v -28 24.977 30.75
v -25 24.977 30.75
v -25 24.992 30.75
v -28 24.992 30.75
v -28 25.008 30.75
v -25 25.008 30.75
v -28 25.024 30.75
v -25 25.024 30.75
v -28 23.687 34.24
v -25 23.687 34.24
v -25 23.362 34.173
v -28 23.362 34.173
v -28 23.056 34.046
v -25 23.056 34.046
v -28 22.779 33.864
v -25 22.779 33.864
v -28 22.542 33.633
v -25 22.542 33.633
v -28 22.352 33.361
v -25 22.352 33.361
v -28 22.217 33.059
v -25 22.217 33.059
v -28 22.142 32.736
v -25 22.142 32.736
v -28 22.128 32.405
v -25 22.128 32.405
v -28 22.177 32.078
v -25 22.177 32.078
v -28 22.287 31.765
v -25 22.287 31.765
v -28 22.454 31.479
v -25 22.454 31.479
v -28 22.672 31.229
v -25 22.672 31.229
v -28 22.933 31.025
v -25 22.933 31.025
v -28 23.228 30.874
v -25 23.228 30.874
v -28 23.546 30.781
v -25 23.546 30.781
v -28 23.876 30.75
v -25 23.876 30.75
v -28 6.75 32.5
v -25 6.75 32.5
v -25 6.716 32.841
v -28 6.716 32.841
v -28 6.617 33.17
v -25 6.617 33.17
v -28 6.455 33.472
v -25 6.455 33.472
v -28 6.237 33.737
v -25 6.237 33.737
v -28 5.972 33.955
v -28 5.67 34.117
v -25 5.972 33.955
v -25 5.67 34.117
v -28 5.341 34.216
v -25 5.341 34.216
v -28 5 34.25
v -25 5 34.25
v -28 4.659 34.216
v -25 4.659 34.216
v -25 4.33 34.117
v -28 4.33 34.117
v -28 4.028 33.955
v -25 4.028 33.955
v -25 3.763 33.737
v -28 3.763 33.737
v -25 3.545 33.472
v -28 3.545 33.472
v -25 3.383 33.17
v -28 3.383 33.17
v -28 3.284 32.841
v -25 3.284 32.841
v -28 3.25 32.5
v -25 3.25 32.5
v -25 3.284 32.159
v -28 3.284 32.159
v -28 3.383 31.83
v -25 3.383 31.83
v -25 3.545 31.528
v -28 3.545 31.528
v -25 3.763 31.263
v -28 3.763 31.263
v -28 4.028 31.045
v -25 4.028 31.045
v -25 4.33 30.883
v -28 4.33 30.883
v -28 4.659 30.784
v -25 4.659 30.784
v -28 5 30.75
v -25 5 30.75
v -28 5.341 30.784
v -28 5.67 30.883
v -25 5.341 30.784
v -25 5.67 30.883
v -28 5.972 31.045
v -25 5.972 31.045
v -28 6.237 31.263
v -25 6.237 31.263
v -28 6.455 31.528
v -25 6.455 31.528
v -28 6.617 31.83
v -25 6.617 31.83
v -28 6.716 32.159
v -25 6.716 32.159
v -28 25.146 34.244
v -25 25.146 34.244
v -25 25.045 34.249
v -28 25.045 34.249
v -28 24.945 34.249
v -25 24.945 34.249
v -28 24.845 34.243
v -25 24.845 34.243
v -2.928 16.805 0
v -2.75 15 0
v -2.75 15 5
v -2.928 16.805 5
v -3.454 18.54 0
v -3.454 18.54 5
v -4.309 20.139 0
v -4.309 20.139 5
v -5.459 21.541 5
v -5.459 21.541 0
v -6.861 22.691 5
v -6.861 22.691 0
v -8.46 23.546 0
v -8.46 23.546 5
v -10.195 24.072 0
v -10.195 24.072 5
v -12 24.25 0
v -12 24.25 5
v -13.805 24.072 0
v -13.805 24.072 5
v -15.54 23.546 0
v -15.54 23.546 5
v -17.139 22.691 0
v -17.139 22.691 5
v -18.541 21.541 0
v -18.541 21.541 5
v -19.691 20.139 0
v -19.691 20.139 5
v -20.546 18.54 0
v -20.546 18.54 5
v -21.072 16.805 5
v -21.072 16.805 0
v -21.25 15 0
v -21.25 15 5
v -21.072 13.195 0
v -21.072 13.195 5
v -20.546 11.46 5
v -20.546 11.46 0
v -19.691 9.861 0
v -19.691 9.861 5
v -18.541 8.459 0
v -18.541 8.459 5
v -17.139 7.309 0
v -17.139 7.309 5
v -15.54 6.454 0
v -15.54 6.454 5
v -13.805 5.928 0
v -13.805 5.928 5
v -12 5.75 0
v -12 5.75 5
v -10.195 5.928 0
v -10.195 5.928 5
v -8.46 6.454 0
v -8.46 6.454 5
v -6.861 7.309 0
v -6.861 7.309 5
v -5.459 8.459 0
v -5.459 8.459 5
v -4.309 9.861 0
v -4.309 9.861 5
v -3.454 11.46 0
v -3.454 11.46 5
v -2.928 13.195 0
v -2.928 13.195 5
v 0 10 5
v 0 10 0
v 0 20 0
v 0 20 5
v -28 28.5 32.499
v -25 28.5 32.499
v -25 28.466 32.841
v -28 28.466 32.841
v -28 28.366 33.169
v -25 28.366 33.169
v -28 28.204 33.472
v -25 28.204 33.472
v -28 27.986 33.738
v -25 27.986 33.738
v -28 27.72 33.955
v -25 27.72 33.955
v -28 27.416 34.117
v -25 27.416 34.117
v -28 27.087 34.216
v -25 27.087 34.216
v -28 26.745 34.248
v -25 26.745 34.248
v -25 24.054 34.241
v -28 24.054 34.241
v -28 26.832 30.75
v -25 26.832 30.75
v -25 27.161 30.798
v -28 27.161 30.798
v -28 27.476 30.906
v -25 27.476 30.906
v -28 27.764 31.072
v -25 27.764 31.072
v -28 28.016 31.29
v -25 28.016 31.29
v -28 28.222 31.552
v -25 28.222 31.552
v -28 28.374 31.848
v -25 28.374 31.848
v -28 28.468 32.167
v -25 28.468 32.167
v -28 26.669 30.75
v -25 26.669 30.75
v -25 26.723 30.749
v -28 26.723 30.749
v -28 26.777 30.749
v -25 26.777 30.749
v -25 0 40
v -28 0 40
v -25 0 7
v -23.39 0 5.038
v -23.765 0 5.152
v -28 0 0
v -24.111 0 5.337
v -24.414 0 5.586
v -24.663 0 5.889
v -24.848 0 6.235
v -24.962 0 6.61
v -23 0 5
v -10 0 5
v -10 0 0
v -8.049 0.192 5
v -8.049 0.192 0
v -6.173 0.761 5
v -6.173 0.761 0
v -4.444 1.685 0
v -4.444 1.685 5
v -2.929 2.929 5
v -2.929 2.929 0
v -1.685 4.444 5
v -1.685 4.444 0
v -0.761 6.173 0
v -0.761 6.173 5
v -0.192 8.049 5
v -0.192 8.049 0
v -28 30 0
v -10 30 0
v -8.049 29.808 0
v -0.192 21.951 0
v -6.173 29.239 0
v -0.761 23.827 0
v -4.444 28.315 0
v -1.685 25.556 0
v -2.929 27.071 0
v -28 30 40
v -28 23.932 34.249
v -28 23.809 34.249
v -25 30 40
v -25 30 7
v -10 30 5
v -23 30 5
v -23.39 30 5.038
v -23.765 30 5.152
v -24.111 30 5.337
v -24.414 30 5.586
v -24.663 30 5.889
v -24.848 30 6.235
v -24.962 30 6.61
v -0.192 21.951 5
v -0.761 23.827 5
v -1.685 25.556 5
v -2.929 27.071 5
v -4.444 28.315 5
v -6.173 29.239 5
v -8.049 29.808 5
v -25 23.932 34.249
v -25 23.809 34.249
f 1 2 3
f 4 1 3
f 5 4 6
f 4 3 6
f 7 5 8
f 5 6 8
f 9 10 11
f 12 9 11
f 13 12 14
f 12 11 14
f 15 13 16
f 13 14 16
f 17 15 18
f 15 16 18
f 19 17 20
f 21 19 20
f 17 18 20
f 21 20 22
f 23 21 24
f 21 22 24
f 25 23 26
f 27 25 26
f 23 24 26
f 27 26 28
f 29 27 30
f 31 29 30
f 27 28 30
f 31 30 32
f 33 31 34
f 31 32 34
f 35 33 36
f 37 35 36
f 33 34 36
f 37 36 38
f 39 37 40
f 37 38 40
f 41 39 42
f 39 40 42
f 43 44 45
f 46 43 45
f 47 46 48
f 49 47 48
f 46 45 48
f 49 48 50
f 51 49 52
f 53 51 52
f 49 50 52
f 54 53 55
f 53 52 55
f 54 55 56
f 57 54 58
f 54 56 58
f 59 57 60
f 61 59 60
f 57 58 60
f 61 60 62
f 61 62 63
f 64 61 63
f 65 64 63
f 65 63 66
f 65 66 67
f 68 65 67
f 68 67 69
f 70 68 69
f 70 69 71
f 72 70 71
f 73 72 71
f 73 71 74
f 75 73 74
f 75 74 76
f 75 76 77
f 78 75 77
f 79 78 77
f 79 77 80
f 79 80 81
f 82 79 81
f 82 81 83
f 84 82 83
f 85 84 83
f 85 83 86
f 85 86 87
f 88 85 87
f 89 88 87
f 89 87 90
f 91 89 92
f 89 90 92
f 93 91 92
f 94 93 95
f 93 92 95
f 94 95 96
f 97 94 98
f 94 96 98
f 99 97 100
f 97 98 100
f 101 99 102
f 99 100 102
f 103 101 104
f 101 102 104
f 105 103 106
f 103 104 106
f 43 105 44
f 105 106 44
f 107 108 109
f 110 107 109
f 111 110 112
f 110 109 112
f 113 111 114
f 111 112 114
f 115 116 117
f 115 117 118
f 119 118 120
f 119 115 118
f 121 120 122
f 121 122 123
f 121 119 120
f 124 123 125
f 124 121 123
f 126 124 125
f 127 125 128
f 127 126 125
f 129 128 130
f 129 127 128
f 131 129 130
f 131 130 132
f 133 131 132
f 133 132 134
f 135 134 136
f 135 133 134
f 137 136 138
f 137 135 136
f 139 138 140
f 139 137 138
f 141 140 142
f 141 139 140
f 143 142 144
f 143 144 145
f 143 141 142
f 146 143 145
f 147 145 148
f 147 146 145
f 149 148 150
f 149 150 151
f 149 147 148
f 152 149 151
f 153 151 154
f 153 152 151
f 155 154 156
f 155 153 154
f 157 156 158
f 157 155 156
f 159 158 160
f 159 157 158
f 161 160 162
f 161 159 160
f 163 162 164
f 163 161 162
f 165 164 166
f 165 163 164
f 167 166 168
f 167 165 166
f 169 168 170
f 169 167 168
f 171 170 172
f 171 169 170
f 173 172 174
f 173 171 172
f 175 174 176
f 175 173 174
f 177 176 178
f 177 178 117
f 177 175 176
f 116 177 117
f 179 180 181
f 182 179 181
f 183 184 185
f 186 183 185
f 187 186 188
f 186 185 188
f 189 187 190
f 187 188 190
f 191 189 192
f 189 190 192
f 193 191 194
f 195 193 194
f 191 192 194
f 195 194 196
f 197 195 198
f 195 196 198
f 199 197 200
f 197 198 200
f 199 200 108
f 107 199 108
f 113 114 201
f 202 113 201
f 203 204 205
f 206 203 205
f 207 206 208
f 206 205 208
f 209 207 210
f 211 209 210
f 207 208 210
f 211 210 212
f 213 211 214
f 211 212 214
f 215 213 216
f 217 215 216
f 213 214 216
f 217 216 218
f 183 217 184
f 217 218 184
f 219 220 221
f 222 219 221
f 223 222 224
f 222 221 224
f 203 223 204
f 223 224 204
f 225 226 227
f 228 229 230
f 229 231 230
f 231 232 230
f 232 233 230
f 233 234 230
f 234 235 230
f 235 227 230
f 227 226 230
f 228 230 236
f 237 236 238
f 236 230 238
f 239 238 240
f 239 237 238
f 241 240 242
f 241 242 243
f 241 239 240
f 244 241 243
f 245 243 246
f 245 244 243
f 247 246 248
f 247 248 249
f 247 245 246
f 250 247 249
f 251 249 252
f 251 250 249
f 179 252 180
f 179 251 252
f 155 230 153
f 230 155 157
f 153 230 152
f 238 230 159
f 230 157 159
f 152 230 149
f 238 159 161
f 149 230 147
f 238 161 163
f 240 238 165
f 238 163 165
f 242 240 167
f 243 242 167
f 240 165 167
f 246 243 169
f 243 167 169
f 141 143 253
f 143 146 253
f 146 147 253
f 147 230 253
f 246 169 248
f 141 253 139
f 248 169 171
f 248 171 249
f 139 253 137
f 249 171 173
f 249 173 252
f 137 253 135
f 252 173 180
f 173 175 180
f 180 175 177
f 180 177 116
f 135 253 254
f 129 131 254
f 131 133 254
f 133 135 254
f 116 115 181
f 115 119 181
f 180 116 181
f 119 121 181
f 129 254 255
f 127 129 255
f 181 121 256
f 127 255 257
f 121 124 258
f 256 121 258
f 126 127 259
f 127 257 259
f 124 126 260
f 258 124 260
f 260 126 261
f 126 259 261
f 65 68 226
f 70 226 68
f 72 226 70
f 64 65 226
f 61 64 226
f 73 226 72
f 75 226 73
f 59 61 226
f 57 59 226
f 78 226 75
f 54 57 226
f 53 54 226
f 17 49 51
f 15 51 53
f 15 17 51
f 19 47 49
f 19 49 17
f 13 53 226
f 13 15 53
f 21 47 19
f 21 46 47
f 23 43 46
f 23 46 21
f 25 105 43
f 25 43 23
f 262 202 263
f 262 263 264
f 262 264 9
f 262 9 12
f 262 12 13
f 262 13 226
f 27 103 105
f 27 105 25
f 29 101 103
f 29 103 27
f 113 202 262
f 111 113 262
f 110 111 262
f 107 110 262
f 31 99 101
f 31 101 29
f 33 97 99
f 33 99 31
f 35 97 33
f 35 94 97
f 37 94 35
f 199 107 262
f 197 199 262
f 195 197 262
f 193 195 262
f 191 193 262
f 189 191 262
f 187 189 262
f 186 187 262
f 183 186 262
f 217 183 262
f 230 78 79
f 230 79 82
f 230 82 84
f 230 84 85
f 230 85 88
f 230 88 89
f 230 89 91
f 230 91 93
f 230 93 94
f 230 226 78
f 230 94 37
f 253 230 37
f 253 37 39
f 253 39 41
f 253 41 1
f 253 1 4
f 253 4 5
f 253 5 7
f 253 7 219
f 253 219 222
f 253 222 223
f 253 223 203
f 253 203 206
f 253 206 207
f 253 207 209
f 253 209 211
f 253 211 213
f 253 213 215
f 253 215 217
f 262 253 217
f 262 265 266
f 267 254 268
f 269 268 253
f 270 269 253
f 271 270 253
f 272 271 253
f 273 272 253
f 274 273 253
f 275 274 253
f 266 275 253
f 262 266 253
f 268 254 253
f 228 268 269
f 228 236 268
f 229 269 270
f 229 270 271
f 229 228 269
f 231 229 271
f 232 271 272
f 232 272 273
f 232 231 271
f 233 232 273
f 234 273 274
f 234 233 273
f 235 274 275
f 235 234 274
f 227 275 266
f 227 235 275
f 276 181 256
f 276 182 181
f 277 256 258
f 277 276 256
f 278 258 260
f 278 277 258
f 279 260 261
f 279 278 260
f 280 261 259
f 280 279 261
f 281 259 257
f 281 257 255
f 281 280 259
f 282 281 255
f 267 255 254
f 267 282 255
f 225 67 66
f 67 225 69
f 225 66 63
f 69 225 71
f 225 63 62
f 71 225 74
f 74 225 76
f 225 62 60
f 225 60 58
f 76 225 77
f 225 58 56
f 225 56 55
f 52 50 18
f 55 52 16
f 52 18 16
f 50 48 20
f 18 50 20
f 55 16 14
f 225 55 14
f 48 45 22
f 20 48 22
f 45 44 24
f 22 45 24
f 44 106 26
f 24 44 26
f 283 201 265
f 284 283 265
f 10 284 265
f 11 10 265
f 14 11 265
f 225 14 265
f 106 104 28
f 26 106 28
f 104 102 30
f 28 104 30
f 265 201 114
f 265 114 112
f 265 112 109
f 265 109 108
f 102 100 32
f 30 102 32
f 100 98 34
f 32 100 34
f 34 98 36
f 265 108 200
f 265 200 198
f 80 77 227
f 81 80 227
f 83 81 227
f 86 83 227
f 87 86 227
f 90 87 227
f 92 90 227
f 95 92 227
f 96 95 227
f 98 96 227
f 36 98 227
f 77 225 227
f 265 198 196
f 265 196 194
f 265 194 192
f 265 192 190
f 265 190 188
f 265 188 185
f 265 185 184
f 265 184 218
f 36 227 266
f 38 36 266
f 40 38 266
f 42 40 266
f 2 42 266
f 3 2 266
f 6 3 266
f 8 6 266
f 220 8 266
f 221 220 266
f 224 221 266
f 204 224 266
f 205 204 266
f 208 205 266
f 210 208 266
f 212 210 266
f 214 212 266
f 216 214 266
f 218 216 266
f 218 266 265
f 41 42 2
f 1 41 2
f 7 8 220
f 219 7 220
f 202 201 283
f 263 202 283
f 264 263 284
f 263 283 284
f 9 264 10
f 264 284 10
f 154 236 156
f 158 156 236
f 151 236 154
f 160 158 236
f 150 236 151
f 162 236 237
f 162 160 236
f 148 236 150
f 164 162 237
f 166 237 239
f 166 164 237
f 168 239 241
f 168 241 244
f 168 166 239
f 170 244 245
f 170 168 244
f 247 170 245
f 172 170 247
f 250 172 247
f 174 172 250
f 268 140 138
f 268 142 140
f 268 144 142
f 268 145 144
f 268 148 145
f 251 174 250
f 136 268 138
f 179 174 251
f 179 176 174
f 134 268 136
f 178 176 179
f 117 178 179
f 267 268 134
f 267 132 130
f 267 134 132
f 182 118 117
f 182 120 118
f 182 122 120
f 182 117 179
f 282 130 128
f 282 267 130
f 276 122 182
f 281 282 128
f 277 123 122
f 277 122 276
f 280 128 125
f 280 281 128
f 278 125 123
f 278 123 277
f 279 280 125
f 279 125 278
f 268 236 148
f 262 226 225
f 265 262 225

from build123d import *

# Parameters (mm, degrees)
F0_W     = 25
F0_H     = 30
F0_R     = 9.25
F0_W_2   = 3
F1_DEPTH = 5
F2_DEPTH = 40
F3_R     = 10
F4_R     = 1.75
F5_DEPTH = 3.001
F6_R     = 2


with BuildPart() as f1:
    # F0 (on Top) → F1 (new body)
    with BuildSketch(Plane.XY):
        with Locations((-12.5, 15)):
            Rectangle(F0_W, F0_H)
        with Locations((-12, 15)):
            Circle(F0_R, mode=Mode.SUBTRACT)
        with Locations((-26.5, 15)):
            Rectangle(F0_W_2, F0_H)
    extrude(amount=F1_DEPTH)

    # F0 (on Top) → F2 (join)
    with BuildSketch(Plane.XY):
        with Locations((-26.5, 15)):
            Rectangle(F0_W_2, F0_H)
    extrude(amount=F2_DEPTH)

    # F3
    f3_edges = [f1.edges().sort_by_distance(p)[0] for p in [
        (0, 0, 2.5),
        (0, 30, 2.5),
    ]]
    fillet(f3_edges, radius=F3_R)

    # F4 (on face) → F5 (cut, through all)
    with BuildSketch(Plane.YZ.offset(-25)):
        with Locations((5, 32.5)):
            Circle(F4_R)
        with BuildLine():
            ThreePointArc((25.8762976423, 34.0147945214), (26.5159190074, 33.3743509381), (26.75, 32.5))
            ThreePointArc((26.75, 32.5), (26.5151696279, 31.6243510986), (25.8737017159, 30.9837067198))
            ThreePointArc((25.8737017159, 30.9837067198), (26.2572446424, 30.8193071518), (26.6688053839, 30.7503858164))
            Line((26.6688053839, 30.7503858164), (26.8316769531, 30.7504083459))
            ThreePointArc((26.8316769531, 30.7504083459), (28.015984309, 31.290286813), (28.4999993582, 32.4985012412))
            ThreePointArc((28.4999993582, 32.4985012412), (27.9856735638, 33.7376982625), (26.7450173494, 34.2484941496))
            ThreePointArc((26.7450173494, 34.2484941496), (26.2953839701, 34.1884198336), (25.8762976423, 34.0147945214))
        make_face()
        with BuildLine():
            ThreePointArc((25.313264961, 33.4976480132), (25.5661966357, 33.7873422376), (25.8762976423, 34.0147945214))
            ThreePointArc((25.8762976423, 34.0147945214), (25.5235901108, 34.1698363381), (25.1455039627, 34.2439405371))
            Line((25.1455039627, 34.2439405371), (24.8445689194, 34.243083813))
            ThreePointArc((24.8445689194, 34.243083813), (24.6385972754, 34.2122756994), (24.4377440921, 34.1572170329))
            ThreePointArc((24.4377440921, 34.1572170329), (24.9284794863, 33.8977522036), (25.313264961, 33.4976480132))
        make_face()
        with BuildLine():
            ThreePointArc((25.1455039627, 34.2439405371), (25.5235901108, 34.1698363381), (25.8762976423, 34.0147945214))
            ThreePointArc((25.8762976423, 34.0147945214), (26.2953839701, 34.1884198336), (26.7450173494, 34.2484941496))
            Line((26.7450173494, 34.2484941496), (25.1455039627, 34.2439405371))
        make_face()
        with BuildLine():
            ThreePointArc((26.6688053839, 30.7503858164), (26.2572446424, 30.8193071518), (25.8737017159, 30.9837067198))
            ThreePointArc((25.8737017159, 30.9837067198), (25.4635661352, 30.8125147591), (25.0235325622, 30.7501582304))
            Line((25.0235325622, 30.7501582304), (26.6688053839, 30.7503858164))
        make_face()
        with BuildLine():
            ThreePointArc((25.0235325622, 30.7501582304), (25.4635661352, 30.8125147591), (25.8737017159, 30.9837067198))
            ThreePointArc((25.8737017159, 30.9837067198), (25.5644222061, 31.2112923163), (25.3122242271, 31.5008526697))
            ThreePointArc((25.3122242271, 31.5008526697), (24.927751526, 31.1016985717), (24.4377457378, 30.8427824088))
            ThreePointArc((24.4377457378, 30.8427824088), (24.7037063498, 30.7752652167), (24.97695154, 30.750151787))
            Line((24.97695154, 30.750151787), (25.0235325622, 30.7501582304))
        make_face()
        with BuildLine():
            Line((24.8445689194, 34.243083813), (25.1455039627, 34.2439405371))
            ThreePointArc((25.1455039627, 34.2439405371), (24.9950179912, 34.2499929084), (24.8445689194, 34.243083813))
        make_face()
        with BuildLine():
            ThreePointArc((24.97695154, 30.750151787), (25.0002420726, 30.7500000167), (25.0235325622, 30.7501582304))
            Line((25.0235325622, 30.7501582304), (24.97695154, 30.750151787))
        make_face()
        with BuildLine():
            Line((26.8316769531, 30.7504083459), (26.6688053839, 30.7503858164))
            ThreePointArc((26.6688053839, 30.7503858164), (26.7502414308, 30.7485012579), (26.8316769531, 30.7504083459))
        make_face()
        with BuildLine():
            ThreePointArc((24.4377440921, 34.1572170329), (24.6385972754, 34.2122756994), (24.8445689194, 34.243083813))
            Line((24.8445689194, 34.243083813), (24.0543595868, 34.2408341869))
            ThreePointArc((24.0543595868, 34.2408341869), (24.248402903, 34.2098052318), (24.4377440921, 34.1572170329))
        make_face()
        with BuildLine():
            ThreePointArc((24.4377457378, 30.8427824088), (23.25, 32.4999991311), (24.4377440921, 34.1572170329))
            ThreePointArc((24.4377440921, 34.1572170329), (24.248402903, 34.2098052318), (24.0543595868, 34.2408341869))
            Line((24.0543595868, 34.2408341869), (23.6867111794, 34.2397875383))
            ThreePointArc((23.6867111794, 34.2397875383), (22.1280512127, 32.4053512558), (23.8757319025, 30.7499994584))
            ThreePointArc((23.8757319025, 30.7499994584), (24.1605392352, 30.7733706928), (24.4377457378, 30.8427824088))
        make_face()
        with BuildLine():
            Line((23.8757319025, 30.7499994584), (24.97695154, 30.750151787))
            ThreePointArc((24.97695154, 30.750151787), (24.7037063498, 30.7752652167), (24.4377457378, 30.8427824088))
            ThreePointArc((24.4377457378, 30.8427824088), (24.1605392352, 30.7733706928), (23.8757319025, 30.7499994584))
        make_face()
        with BuildLine():
            Line((23.6867111794, 34.2397875383), (24.0543595868, 34.2408341869))
            ThreePointArc((24.0543595868, 34.2408341869), (23.8705078211, 34.2499923501), (23.6867111794, 34.2397875383))
        make_face()
        with BuildLine():
            ThreePointArc((25.8737017159, 30.9837067198), (26.5151696279, 31.6243510986), (26.75, 32.5))
            ThreePointArc((26.75, 32.5), (26.5159190074, 33.3743509381), (25.8762976423, 34.0147945214))
            ThreePointArc((25.8762976423, 34.0147945214), (25.5661966357, 33.7873422376), (25.313264961, 33.4976480132))
            ThreePointArc((25.313264961, 33.4976480132), (25.545610556, 33.0226817163), (25.6254898299, 32.4999994417))
            ThreePointArc((25.6254898299, 32.4999994417), (25.5453379061, 31.9764467676), (25.3122242271, 31.5008526697))
            ThreePointArc((25.3122242271, 31.5008526697), (25.5644222061, 31.2112923163), (25.8737017159, 30.9837067198))
        make_face()
        with BuildLine():
            ThreePointArc((25.3122242271, 31.5008526697), (24.9999995959, 32.4994133448), (25.313264961, 33.4976480132))
            ThreePointArc((25.313264961, 33.4976480132), (24.9284794863, 33.8977522036), (24.4377440921, 34.1572170329))
            ThreePointArc((24.4377440921, 34.1572170329), (23.25, 32.4999991311), (24.4377457378, 30.8427824088))
            ThreePointArc((24.4377457378, 30.8427824088), (24.927751526, 31.1016985717), (25.3122242271, 31.5008526697))
        make_face()
        with BuildLine():
            ThreePointArc((25.6254898299, 32.4999994417), (25.545610556, 33.0226817163), (25.313264961, 33.4976480132))
            ThreePointArc((25.313264961, 33.4976480132), (24.9999995959, 32.4994133448), (25.3122242271, 31.5008526697))
            ThreePointArc((25.3122242271, 31.5008526697), (25.5453379061, 31.9764467676), (25.6254898299, 32.4999994417))
        make_face()
    extrude(amount=-F5_DEPTH, mode=Mode.SUBTRACT)

    # F6
    f6_edges = [f1.edges().sort_by_distance(p)[0] for p in [
        (-25, 15, 5),
    ]]
    fillet(f6_edges, radius=F6_R)


solid = f1.part
